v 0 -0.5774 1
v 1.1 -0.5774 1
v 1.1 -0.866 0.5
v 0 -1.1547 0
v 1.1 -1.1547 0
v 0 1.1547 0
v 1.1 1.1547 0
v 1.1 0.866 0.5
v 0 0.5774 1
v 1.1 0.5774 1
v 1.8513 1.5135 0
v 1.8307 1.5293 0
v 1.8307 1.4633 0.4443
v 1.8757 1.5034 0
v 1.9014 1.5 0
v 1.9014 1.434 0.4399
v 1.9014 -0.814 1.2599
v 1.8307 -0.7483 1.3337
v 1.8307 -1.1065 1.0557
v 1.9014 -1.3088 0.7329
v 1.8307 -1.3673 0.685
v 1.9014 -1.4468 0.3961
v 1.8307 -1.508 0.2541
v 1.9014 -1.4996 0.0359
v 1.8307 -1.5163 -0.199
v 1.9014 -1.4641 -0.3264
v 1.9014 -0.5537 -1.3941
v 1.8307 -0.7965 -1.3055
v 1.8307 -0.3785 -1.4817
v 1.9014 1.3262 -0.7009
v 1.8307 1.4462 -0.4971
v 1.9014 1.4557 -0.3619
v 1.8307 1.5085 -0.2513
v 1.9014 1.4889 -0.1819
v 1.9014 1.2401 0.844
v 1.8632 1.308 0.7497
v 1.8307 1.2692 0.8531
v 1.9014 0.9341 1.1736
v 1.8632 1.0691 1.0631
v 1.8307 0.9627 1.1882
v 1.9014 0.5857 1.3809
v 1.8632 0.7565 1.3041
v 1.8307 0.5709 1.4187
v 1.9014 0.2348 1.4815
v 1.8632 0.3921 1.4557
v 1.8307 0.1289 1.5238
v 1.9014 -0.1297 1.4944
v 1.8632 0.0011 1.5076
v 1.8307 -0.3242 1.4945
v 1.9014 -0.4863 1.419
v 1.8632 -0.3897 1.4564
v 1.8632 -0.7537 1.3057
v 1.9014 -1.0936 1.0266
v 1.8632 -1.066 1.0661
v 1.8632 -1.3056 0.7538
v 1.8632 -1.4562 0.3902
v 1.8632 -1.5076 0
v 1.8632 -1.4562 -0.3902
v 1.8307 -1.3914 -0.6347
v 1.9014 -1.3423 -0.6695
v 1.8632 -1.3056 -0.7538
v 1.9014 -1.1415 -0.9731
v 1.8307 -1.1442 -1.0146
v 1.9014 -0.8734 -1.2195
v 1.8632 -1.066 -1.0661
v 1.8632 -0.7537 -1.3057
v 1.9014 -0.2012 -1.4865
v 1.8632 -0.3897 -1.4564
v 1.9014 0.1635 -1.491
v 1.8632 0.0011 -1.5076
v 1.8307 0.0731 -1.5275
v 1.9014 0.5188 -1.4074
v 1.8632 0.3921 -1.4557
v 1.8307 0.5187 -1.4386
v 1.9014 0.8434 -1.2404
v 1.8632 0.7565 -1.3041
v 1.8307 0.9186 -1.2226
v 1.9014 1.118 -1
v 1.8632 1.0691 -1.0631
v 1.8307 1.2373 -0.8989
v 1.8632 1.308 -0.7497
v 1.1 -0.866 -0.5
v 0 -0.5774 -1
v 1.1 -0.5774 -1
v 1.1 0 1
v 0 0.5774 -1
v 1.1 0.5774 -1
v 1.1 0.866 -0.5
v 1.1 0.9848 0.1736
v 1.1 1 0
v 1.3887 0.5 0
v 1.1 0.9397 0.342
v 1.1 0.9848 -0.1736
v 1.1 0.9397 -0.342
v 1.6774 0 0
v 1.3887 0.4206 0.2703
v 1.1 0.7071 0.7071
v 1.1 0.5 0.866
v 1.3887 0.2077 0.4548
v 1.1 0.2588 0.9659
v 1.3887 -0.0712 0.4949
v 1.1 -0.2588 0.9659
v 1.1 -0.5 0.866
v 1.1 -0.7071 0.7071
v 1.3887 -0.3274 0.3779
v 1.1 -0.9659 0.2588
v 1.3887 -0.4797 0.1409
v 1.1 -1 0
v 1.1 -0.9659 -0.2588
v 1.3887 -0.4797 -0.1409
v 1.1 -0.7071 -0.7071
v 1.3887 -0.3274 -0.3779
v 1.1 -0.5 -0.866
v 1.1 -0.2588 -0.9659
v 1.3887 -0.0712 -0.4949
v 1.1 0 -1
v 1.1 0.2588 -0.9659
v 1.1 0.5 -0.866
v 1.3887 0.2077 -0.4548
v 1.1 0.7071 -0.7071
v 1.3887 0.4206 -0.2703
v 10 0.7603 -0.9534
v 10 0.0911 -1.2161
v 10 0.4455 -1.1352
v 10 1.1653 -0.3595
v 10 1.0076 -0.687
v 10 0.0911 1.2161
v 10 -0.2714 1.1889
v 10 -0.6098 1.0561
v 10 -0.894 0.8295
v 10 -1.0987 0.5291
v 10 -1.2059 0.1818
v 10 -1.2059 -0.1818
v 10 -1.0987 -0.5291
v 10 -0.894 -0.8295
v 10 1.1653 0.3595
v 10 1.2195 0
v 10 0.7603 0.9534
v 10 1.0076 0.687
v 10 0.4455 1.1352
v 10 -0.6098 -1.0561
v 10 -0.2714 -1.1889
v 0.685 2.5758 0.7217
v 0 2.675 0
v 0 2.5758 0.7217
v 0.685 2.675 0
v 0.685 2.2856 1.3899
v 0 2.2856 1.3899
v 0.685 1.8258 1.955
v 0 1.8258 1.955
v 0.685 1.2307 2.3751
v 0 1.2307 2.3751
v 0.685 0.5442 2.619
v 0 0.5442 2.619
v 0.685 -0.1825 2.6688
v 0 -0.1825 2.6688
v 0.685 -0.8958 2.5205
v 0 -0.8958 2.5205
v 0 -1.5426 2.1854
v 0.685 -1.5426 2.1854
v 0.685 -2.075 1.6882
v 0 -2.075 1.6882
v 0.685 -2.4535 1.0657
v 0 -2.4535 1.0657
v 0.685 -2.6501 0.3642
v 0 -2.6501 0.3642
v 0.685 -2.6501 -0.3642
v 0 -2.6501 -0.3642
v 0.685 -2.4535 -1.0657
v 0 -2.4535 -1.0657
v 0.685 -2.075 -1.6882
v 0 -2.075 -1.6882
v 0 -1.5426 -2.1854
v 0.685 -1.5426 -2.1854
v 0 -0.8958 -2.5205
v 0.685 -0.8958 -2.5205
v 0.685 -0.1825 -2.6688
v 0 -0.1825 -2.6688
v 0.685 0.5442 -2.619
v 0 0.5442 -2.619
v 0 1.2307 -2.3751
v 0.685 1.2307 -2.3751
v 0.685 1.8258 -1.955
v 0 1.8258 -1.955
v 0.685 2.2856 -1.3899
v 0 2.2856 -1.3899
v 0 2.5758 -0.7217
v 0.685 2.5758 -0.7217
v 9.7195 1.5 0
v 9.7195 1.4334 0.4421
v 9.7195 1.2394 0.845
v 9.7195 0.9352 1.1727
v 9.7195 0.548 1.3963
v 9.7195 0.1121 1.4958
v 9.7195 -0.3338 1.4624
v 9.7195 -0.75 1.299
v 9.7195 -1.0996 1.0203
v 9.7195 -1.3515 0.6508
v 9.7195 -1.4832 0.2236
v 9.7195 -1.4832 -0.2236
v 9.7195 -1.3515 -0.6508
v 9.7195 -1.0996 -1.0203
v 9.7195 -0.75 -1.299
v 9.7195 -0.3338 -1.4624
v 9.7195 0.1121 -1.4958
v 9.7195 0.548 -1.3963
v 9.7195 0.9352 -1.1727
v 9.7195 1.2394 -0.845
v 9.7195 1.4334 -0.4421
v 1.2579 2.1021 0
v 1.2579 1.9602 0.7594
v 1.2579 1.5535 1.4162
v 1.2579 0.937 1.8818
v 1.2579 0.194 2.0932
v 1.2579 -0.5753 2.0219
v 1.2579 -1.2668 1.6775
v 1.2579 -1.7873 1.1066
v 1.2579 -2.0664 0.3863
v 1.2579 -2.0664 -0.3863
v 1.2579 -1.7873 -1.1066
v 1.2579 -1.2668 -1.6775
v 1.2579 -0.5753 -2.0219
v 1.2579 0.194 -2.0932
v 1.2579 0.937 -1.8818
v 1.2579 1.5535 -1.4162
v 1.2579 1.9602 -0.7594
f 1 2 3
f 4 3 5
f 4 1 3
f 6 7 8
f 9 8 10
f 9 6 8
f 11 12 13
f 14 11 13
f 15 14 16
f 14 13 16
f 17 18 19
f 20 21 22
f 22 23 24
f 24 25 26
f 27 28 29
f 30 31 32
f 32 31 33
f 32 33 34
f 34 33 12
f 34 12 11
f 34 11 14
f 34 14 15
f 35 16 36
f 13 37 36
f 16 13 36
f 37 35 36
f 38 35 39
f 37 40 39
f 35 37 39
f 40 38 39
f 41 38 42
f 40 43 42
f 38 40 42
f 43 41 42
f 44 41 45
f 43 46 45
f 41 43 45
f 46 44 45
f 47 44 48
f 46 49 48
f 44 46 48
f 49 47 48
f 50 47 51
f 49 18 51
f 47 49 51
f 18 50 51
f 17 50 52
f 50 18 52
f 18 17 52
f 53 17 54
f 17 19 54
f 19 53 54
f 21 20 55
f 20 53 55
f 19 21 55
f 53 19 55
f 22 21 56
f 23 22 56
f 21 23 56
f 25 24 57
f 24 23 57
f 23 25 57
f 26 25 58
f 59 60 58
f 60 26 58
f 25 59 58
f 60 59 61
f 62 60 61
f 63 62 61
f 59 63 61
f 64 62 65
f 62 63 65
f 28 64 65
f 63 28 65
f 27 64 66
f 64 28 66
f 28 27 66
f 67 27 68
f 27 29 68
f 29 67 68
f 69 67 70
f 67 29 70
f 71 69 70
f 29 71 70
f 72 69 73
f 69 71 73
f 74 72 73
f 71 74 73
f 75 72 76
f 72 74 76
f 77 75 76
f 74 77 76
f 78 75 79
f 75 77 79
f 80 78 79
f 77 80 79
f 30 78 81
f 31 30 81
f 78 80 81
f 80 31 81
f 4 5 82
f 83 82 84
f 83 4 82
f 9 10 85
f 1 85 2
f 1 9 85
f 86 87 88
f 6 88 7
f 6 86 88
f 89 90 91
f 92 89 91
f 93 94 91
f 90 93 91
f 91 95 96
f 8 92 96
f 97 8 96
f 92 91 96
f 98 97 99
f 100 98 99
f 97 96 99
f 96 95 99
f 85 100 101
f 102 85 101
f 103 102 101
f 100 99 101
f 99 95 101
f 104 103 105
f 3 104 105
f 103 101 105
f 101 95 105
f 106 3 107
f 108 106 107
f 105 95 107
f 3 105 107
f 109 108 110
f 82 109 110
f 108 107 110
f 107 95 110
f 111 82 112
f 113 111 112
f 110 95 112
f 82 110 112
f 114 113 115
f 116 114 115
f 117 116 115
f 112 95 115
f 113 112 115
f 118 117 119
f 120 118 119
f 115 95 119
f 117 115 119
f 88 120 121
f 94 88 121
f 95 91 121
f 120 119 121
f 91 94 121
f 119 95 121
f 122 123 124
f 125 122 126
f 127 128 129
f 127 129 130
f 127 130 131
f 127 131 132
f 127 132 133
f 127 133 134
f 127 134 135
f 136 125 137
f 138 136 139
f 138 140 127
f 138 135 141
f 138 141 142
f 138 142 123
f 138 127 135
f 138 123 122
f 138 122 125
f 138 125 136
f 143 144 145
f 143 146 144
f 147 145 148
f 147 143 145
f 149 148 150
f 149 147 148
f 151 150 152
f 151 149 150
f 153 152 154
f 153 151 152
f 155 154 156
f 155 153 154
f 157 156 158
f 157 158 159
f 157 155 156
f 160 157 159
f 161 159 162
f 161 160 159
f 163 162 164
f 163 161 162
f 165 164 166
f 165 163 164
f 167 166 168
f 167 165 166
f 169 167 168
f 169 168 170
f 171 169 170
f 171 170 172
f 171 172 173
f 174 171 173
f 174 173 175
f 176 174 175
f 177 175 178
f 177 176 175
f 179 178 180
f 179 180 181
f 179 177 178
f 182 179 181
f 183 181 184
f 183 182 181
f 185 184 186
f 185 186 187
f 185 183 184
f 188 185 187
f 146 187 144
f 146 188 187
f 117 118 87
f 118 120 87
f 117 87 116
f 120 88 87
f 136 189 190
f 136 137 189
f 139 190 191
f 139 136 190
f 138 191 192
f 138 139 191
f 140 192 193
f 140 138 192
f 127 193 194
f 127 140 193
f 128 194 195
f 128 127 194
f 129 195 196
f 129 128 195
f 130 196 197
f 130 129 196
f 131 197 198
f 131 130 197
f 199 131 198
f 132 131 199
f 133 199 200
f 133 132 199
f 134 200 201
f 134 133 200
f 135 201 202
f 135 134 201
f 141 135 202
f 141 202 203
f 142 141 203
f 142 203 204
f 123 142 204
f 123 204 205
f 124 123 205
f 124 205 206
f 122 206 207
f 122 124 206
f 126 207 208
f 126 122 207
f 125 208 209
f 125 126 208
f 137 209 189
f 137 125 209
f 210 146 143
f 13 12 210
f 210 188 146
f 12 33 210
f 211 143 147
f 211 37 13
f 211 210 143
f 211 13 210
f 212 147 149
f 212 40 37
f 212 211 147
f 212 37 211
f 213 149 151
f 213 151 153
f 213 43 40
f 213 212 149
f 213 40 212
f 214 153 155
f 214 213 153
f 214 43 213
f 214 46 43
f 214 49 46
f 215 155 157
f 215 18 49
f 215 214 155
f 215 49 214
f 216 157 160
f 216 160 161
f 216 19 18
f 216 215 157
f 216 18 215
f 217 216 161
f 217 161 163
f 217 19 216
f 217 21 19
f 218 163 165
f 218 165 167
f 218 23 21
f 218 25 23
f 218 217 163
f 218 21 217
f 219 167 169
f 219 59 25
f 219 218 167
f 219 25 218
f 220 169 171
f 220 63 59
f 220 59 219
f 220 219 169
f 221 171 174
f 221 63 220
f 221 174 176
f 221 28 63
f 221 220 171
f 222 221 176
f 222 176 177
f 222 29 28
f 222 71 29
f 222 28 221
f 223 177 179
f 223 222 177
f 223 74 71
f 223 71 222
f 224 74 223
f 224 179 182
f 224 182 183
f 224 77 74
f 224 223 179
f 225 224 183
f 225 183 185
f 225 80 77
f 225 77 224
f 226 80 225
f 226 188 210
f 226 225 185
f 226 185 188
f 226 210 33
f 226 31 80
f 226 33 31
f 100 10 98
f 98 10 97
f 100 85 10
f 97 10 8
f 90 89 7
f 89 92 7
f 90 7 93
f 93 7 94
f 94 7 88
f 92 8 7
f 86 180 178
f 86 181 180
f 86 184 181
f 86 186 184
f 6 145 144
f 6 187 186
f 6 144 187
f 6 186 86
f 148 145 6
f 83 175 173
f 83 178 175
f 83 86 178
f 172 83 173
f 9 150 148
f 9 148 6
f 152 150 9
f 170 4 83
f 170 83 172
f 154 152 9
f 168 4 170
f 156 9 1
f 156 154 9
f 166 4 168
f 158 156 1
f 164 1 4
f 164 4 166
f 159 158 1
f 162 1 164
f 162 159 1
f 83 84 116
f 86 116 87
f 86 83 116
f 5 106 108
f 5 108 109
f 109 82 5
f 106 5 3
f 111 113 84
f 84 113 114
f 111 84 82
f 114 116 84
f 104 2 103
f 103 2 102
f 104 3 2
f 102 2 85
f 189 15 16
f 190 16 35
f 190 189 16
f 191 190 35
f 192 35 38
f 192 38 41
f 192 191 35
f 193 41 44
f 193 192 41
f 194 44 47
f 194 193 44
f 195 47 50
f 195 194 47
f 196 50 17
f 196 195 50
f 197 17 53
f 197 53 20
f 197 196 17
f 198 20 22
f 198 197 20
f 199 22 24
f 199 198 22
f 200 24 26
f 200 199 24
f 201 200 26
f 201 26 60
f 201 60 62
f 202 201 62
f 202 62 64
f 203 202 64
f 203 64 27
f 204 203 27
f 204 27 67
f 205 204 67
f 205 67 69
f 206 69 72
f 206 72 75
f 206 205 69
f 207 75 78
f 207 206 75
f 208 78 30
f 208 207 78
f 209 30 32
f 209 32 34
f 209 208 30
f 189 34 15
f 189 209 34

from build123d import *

# Parameters (mm, degrees)
FILLET1_R   = 0.1
HEX_2_DEPTH = 1.1


with BuildPart() as part:
    # BodySke → BaseBody (revolve)
    with BuildSketch(Plane.XY):
        Polygon((0, 0), (0, 2.675), (0.685, 2.675), (1.86, 1.5), (9.7195, 1.5), (10, 1.2195), (10, 0), align=None)
    revolve(axis=Axis((0, 0, 0), (1, 0, 0)))

    # Fillet1
    fillet1_edges = [part.edges().sort_by_distance(p)[0] for p in [
        (1.86, -1.5, 0),
    ]]
    fillet(fillet1_edges, radius=FILLET1_R)

    # Sketch2 → PreBroach (revolve, cut)
    with BuildSketch(Plane.XY):
        Polygon((0, 1), (1.1, 1), (1.677350269, 0), (0, 0), align=None)
    revolve(axis=Axis((0, 0, 0), (1, 0, 0)), mode=Mode.SUBTRACT)

    # Sketch3 → Hex 2 (cut)
    with BuildSketch(Plane.ZY):
        Polygon((-1, -0.577350269), (-1, 0.577350269), (0, 1.154700538), (1, 0.577350269), (1, -0.577350269), (0, -1.154700538), align=None)
    extrude(amount=-HEX_2_DEPTH, mode=Mode.SUBTRACT)


solid = part.part
